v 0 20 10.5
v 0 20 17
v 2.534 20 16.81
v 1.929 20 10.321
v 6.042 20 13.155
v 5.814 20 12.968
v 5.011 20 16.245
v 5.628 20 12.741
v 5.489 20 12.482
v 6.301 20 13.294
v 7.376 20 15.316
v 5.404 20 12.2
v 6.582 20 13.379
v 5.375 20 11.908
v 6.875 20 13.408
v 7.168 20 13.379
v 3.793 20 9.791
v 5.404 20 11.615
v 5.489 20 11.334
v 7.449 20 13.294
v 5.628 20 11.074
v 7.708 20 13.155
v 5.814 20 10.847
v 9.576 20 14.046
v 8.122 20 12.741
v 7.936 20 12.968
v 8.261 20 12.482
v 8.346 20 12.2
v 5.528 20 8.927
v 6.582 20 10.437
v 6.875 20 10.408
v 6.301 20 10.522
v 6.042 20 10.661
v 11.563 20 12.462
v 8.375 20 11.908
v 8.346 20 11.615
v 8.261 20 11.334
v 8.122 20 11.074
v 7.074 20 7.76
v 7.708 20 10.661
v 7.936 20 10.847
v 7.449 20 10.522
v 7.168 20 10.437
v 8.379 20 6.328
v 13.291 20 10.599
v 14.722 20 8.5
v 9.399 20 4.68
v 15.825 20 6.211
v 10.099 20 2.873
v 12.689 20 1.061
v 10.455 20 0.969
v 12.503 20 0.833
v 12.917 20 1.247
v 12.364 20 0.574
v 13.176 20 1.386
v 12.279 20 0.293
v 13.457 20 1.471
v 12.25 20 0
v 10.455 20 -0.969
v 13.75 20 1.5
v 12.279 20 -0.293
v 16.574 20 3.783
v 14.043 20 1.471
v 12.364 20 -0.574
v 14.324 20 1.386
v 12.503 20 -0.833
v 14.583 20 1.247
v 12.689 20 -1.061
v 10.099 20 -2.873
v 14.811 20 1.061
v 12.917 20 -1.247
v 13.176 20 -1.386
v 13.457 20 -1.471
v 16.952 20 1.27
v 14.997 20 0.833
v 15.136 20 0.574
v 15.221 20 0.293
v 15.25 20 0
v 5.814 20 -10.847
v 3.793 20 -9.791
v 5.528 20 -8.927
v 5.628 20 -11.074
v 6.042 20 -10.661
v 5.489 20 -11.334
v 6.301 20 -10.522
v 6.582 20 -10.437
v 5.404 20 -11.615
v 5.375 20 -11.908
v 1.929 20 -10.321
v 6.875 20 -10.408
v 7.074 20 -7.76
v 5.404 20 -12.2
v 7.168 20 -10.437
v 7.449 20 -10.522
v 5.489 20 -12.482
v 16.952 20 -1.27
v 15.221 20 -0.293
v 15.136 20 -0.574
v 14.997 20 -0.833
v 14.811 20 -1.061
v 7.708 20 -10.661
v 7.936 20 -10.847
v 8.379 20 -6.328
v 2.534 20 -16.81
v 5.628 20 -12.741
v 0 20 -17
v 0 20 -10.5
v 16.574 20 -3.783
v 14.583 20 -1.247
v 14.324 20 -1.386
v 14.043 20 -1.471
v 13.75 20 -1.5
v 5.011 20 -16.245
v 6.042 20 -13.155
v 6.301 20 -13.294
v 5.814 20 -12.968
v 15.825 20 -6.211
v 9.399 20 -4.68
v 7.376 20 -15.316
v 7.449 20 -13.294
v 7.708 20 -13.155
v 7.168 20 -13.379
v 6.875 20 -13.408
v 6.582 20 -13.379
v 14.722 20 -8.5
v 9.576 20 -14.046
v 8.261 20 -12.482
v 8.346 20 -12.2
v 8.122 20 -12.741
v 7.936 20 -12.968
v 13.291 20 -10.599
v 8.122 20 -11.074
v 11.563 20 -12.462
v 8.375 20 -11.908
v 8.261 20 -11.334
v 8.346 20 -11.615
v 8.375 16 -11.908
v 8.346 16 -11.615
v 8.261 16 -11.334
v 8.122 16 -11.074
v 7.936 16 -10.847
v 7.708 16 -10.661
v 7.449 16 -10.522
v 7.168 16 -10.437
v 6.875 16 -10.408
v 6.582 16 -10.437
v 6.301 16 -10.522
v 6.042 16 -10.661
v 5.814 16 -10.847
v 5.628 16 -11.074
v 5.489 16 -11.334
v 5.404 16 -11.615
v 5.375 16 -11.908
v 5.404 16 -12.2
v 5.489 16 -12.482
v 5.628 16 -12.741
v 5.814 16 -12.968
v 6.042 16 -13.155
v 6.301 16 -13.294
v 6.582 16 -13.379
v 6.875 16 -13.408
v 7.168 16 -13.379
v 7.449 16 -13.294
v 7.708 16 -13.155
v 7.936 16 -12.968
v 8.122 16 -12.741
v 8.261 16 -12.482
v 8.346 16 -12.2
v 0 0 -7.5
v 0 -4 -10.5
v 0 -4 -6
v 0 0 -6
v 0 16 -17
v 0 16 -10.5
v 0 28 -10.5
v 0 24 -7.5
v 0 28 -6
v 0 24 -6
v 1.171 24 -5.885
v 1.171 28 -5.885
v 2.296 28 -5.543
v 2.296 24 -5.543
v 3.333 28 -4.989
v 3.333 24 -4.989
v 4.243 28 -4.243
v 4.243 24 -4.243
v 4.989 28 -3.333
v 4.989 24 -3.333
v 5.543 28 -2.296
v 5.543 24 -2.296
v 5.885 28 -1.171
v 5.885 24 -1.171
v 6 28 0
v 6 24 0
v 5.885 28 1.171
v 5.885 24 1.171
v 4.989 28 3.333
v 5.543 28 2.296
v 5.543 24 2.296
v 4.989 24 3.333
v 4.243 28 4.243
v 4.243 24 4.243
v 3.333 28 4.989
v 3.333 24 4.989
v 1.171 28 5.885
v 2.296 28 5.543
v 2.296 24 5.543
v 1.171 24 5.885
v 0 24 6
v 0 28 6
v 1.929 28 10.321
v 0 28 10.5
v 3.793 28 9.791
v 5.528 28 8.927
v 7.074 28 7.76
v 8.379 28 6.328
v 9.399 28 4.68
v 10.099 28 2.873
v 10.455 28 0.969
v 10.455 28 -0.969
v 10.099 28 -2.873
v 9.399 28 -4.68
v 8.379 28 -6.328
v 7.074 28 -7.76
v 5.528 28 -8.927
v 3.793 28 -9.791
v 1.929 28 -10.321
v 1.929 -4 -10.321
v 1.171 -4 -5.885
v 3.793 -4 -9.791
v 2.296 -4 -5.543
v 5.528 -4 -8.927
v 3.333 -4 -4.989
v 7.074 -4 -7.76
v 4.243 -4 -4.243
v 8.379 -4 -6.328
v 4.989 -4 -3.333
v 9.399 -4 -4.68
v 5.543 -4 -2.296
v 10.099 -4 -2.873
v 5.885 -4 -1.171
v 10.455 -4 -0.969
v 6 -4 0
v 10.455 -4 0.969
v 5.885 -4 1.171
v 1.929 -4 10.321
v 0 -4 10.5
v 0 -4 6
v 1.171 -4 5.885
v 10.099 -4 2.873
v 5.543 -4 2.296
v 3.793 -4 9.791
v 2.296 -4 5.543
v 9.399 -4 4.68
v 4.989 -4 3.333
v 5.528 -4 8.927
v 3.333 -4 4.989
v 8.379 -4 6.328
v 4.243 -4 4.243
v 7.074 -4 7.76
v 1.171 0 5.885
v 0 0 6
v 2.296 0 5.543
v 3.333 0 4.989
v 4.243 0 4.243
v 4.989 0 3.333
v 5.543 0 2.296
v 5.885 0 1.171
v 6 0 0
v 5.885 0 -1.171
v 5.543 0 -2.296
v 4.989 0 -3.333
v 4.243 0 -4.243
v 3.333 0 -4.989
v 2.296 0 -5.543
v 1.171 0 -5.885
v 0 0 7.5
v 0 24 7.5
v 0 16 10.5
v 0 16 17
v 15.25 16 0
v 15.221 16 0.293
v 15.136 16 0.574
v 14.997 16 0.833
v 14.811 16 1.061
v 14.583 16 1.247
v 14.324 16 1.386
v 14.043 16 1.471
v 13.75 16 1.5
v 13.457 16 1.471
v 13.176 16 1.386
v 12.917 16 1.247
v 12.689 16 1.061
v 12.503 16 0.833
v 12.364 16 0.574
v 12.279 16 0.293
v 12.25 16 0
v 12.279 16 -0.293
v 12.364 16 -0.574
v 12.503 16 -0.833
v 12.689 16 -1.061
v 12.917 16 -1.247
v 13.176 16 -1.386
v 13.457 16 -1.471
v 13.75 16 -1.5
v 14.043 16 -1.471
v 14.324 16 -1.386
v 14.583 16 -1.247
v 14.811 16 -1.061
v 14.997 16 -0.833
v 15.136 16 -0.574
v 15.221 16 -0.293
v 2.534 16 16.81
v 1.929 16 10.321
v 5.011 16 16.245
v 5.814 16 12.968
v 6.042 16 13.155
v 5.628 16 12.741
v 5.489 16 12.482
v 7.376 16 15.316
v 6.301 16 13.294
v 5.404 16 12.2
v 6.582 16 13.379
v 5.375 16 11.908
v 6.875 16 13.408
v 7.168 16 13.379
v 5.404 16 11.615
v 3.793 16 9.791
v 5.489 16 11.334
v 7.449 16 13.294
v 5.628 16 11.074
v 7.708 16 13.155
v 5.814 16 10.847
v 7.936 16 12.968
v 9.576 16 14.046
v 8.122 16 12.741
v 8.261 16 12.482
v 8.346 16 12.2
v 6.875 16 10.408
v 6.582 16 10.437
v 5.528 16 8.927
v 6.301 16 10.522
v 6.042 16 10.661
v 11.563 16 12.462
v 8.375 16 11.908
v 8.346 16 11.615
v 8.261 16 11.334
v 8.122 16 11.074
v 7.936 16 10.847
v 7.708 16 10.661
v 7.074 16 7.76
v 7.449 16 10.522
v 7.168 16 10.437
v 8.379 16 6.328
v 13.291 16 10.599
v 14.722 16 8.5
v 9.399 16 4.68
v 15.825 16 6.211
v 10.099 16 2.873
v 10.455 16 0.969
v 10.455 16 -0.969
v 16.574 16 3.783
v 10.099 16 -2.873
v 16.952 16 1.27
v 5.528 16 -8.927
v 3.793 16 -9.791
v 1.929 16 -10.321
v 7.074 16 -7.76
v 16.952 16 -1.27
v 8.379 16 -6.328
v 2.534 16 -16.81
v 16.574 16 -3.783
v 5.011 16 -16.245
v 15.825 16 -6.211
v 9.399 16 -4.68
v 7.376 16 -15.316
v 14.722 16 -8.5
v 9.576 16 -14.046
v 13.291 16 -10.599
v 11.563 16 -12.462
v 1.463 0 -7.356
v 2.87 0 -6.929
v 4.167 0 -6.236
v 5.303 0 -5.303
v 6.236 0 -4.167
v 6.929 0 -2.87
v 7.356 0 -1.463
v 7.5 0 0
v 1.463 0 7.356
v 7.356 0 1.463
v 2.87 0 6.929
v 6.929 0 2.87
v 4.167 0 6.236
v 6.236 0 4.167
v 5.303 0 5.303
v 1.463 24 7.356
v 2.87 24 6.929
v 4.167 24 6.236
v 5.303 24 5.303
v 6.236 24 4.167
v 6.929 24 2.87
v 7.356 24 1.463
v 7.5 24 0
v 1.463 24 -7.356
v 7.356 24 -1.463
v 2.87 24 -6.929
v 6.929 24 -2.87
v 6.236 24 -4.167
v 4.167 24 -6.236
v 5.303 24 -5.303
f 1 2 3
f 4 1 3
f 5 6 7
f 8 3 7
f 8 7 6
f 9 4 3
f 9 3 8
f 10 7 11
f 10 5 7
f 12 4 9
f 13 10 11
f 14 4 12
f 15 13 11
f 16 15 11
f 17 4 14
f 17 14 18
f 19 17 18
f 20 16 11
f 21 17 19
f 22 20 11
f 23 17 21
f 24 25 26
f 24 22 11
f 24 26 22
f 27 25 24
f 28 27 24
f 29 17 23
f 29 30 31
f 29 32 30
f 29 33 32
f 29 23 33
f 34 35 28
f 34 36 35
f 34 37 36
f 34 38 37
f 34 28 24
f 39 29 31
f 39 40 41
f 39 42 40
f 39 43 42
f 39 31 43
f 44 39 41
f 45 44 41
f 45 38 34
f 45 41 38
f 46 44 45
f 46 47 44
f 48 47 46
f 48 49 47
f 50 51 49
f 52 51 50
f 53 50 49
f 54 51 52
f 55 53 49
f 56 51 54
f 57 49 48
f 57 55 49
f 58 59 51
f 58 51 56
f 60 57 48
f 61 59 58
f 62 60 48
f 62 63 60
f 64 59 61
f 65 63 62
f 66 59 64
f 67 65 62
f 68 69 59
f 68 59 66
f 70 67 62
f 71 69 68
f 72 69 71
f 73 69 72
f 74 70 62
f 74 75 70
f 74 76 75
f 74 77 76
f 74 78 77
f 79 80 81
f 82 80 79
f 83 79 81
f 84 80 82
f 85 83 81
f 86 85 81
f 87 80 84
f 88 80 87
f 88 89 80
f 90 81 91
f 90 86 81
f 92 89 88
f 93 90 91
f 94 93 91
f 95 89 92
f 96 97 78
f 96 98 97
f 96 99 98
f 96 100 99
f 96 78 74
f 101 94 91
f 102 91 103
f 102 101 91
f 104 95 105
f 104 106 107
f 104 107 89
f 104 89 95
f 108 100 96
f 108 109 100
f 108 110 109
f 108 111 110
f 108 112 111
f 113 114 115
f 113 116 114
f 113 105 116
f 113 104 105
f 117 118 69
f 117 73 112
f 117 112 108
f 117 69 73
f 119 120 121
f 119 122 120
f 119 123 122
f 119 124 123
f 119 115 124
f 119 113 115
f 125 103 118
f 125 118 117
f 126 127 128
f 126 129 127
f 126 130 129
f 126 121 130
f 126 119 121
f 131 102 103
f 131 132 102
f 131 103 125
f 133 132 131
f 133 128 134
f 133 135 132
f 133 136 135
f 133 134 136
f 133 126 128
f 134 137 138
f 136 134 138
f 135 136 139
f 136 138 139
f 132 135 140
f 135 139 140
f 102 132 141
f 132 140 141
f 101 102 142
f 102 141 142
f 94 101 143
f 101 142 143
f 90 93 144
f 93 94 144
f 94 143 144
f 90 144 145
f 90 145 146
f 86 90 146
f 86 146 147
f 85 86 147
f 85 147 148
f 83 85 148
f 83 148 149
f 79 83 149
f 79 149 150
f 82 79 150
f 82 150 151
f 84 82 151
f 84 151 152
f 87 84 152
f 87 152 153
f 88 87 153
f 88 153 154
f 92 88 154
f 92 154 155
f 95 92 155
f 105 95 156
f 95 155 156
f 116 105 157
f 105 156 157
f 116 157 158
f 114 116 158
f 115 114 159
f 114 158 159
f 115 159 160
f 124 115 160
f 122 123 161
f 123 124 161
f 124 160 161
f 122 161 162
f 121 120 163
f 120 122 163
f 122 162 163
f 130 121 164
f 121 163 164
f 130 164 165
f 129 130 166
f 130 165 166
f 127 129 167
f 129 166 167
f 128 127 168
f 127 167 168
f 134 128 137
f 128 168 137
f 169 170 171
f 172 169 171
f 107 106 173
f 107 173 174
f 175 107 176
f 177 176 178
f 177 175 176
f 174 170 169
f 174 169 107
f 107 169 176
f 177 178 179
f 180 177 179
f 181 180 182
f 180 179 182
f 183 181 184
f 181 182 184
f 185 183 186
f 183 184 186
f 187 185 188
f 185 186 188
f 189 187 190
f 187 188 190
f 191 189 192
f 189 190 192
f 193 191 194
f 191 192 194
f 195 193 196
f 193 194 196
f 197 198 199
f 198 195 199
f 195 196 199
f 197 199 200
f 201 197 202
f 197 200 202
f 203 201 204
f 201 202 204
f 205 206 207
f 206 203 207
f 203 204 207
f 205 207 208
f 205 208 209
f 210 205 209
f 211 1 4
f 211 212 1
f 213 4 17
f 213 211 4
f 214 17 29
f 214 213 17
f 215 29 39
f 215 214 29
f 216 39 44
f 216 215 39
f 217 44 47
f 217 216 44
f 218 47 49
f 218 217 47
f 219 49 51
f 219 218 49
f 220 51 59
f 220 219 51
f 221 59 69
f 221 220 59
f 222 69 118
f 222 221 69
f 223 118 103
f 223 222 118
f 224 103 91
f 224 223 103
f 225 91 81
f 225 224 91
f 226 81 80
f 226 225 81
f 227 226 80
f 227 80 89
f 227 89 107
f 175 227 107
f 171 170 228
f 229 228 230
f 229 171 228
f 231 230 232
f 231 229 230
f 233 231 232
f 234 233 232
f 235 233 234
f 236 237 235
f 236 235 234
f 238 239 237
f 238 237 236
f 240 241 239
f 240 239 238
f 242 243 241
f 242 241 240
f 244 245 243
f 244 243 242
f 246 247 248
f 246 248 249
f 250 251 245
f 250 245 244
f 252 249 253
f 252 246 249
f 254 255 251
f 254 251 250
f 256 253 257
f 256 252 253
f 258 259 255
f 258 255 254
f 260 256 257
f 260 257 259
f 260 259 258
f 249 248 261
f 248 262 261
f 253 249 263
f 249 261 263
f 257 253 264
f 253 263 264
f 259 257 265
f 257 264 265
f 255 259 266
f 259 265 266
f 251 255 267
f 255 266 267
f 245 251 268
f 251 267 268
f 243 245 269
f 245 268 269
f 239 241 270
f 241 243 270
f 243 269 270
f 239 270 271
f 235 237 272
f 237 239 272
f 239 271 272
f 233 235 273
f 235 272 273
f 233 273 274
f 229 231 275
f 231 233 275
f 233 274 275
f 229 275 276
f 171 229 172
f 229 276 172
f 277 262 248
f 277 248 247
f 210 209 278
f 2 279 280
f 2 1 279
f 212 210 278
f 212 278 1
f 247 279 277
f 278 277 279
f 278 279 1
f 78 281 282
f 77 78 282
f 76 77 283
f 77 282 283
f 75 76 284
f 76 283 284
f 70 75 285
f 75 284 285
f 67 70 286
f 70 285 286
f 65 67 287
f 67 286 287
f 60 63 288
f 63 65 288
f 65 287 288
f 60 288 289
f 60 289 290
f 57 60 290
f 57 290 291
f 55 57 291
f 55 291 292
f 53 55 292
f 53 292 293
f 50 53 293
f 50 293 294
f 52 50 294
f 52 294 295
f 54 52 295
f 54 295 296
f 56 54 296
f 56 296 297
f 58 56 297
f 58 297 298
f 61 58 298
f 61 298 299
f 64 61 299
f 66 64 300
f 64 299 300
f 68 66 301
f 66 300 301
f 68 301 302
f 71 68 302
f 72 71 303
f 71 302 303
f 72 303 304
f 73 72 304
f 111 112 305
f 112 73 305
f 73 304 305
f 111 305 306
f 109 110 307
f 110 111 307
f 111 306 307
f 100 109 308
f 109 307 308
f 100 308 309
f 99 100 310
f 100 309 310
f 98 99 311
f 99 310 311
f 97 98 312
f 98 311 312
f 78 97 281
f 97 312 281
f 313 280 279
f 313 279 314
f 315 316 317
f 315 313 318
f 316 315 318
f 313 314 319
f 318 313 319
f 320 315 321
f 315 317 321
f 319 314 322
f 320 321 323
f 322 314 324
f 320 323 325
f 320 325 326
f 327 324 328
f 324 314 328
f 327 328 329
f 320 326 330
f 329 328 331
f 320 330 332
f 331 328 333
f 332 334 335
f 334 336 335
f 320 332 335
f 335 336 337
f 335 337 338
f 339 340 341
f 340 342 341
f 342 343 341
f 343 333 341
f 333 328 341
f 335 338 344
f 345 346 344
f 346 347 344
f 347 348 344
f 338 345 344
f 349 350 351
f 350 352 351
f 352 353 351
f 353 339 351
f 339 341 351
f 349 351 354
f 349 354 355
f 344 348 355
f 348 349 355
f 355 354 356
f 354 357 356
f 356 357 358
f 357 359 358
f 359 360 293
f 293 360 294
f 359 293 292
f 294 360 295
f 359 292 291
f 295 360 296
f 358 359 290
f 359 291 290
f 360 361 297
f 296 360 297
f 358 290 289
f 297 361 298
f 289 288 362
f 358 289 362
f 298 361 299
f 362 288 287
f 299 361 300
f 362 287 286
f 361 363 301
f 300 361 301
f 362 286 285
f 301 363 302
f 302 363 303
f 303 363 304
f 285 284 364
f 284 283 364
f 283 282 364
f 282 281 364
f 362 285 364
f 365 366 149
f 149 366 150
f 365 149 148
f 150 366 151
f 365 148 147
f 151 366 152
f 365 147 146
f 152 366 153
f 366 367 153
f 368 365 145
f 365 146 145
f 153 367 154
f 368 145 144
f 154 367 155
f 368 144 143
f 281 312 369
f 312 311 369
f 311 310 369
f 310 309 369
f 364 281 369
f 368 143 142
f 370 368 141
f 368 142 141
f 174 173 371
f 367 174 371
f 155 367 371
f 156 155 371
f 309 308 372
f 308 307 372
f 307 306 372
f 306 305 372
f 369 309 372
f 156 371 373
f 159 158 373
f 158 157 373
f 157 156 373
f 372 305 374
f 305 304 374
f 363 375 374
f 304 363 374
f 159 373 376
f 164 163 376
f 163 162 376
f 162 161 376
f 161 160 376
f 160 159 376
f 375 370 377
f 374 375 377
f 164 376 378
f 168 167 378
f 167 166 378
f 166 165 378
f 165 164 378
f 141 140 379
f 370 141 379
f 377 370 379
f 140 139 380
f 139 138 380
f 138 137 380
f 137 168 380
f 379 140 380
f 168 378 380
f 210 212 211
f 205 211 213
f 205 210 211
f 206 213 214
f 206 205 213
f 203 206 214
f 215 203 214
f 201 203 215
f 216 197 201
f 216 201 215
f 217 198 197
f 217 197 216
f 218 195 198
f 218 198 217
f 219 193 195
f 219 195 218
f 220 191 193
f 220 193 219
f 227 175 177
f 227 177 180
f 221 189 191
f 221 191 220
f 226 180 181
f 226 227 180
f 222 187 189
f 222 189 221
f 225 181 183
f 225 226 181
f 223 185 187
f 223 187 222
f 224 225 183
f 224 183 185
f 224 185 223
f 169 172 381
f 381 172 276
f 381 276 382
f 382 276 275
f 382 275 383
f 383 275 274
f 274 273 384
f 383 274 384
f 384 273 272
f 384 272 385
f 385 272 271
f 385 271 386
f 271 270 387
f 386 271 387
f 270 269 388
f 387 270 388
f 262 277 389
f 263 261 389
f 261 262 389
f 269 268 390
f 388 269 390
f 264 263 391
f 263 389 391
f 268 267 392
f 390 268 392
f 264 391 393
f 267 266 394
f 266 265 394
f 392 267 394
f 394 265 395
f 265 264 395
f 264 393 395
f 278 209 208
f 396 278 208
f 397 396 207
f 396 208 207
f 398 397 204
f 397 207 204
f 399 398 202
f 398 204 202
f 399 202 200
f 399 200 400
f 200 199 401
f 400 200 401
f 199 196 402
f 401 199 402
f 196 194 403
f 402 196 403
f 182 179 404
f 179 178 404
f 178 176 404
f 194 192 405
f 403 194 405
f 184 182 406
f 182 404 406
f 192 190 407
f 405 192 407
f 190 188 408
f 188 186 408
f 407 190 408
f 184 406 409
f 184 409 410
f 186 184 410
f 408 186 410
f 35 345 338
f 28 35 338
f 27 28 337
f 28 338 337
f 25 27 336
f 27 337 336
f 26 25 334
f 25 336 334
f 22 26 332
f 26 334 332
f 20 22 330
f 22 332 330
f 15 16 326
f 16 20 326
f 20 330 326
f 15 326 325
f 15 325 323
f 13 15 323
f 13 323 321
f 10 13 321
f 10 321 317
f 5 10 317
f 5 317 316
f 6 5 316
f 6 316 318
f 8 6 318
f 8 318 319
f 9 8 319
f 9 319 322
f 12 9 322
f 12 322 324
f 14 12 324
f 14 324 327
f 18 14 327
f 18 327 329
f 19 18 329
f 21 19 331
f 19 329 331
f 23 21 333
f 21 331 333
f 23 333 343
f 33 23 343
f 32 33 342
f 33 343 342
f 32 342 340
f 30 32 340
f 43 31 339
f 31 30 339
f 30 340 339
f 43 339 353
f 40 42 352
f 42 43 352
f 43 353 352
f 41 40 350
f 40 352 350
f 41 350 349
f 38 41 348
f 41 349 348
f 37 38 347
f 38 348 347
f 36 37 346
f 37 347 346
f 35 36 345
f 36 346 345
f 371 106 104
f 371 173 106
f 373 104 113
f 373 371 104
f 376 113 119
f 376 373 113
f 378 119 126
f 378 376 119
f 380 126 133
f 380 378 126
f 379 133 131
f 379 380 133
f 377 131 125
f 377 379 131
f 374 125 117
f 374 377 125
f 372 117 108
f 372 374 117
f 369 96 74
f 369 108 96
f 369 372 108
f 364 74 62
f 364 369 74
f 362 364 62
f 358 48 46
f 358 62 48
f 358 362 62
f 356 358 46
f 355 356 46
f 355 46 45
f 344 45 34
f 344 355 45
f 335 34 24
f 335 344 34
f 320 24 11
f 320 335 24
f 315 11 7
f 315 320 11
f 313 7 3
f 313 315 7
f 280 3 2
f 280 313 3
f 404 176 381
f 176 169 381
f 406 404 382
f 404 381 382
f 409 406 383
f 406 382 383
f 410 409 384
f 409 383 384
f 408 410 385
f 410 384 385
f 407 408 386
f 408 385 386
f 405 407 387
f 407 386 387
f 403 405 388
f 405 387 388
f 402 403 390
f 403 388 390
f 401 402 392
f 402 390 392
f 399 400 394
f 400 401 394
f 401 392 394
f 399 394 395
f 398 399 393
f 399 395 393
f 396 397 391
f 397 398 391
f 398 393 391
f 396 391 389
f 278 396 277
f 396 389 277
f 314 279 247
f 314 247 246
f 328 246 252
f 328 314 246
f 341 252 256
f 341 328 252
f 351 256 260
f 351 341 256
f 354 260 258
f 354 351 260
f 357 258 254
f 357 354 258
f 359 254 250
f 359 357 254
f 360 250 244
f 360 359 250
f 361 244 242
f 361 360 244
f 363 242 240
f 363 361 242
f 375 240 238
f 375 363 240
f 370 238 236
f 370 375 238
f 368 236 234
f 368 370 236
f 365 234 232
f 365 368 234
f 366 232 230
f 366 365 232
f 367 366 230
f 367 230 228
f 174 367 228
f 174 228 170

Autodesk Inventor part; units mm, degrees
ref_plane "YZ Plane" through (0, 0, 0) normal (1, 0, 0) x (0, 1, 0)
ref_plane "XZ Plane" through (0, 0, 0) normal (0, 1, 0) x (-1, 0, 0)
ref_plane "XY Plane" through (0, 0, 0) normal (0, 0, 1) x (1, 0, 0)
sketch "Sketch1" plane through (0, 0, 0) normal (0, 1, 0) x (-1, 0, 0)
  arc A0 (0, 7.5) -> (0, -7.5) centre (0, 0) ccw
  arc A1 (0, 10.5) -> (0, -10.5) centre (0, 0) ccw
  line L0 (0, 10.5) -> (0, 7.5)
  line L1 (0, -7.5) -> (0, -10.5)
  dimension "d0" = 7.5
  dimension "d1" = 3
extrude "Extrusion1" add sketch "Sketch1" along normal blind 24
sketch "Sketch2" plane through (0, 24, 0) normal (0, 1, 0) x (1, 0, 0)
  line L0 (0, 10.5) -> (0, 7.5) projected
  line L1 (0, -7.5) -> (0, -10.5) projected
  arc A0 (0, -10.5) -> (0, 10.5) centre (0, 0) ccw projected
  arc A1 (0, -6) -> (0, 6) centre (0, 0) ccw
  line L2 (0, 0) -> (0, 6) construction
  line L3 (0, 0) -> (6, 0) construction
  line L4 (0, 0) -> (0, -6) construction
  line L5 (0, 6) -> (0, 10.5)
  line L6 (0, -6) -> (0, -10.5)
  dimension "d6" = 6
  dimension "d7" = 90
  dimension "d8" = 180
extrude "Extrusion2" add sketch "Sketch2" along normal blind 4
sketch "Sketch3" plane through (0, 0, 0) normal (0, -1, 0) x (1, 0, 0)
  line L0 (0, -10.5) -> (0, -6) projected
  arc A0 (0, -6) -> (0, 6) centre (0, 0) ccw projected
  line L1 (0, 6) -> (0, 10.5) projected
  arc A1 (0, -10.5) -> (0, 10.5) centre (0, 0) ccw projected
extrude "Extrusion3" add sketch "Sketch3" along normal blind 4
ref_plane "Work Plane2" through (0, 16, 0) normal (0, 1, 0) x (1, 0, 0)
ref_plane "Work Plane1" through (0, 12, 0) normal (0, 1, 0) x (1, 0, 0)
sketch "Sketch5" plane through (0, 16, 0) normal (0, 1, 0) x (1, 0, 0)
  arc A0 (0, -10.5) -> (0, 10.5) centre (0, 0) ccw projected
  arc A1 (0, -17) -> (0, 17) centre (0, 0) ccw
  line L0 (0, 10.5) -> (0, 6) projected
  line L1 (0, 17) -> (0, 10.5)
  line L2 (0, -10.5) -> (0, -17)
  circle A2 centre (13.75, 0) radius 1.5
  line L3 (10.5, 0) -> (17, 0) construction
  circle A3 centre (6.875, 11.9078) radius 1.5
  circle A4 centre (6.875, -11.9078) radius 1.5
  dimension "d22" = 6.5
  dimension "d23" = 3
  dimension "d26" = 60
  dimension "d30" = 60
extrude "Extrusion4" add sketch "Sketch5" along normal blind 4
properties part number "Bearing_Holder" material "PC/ABS Plastic"
